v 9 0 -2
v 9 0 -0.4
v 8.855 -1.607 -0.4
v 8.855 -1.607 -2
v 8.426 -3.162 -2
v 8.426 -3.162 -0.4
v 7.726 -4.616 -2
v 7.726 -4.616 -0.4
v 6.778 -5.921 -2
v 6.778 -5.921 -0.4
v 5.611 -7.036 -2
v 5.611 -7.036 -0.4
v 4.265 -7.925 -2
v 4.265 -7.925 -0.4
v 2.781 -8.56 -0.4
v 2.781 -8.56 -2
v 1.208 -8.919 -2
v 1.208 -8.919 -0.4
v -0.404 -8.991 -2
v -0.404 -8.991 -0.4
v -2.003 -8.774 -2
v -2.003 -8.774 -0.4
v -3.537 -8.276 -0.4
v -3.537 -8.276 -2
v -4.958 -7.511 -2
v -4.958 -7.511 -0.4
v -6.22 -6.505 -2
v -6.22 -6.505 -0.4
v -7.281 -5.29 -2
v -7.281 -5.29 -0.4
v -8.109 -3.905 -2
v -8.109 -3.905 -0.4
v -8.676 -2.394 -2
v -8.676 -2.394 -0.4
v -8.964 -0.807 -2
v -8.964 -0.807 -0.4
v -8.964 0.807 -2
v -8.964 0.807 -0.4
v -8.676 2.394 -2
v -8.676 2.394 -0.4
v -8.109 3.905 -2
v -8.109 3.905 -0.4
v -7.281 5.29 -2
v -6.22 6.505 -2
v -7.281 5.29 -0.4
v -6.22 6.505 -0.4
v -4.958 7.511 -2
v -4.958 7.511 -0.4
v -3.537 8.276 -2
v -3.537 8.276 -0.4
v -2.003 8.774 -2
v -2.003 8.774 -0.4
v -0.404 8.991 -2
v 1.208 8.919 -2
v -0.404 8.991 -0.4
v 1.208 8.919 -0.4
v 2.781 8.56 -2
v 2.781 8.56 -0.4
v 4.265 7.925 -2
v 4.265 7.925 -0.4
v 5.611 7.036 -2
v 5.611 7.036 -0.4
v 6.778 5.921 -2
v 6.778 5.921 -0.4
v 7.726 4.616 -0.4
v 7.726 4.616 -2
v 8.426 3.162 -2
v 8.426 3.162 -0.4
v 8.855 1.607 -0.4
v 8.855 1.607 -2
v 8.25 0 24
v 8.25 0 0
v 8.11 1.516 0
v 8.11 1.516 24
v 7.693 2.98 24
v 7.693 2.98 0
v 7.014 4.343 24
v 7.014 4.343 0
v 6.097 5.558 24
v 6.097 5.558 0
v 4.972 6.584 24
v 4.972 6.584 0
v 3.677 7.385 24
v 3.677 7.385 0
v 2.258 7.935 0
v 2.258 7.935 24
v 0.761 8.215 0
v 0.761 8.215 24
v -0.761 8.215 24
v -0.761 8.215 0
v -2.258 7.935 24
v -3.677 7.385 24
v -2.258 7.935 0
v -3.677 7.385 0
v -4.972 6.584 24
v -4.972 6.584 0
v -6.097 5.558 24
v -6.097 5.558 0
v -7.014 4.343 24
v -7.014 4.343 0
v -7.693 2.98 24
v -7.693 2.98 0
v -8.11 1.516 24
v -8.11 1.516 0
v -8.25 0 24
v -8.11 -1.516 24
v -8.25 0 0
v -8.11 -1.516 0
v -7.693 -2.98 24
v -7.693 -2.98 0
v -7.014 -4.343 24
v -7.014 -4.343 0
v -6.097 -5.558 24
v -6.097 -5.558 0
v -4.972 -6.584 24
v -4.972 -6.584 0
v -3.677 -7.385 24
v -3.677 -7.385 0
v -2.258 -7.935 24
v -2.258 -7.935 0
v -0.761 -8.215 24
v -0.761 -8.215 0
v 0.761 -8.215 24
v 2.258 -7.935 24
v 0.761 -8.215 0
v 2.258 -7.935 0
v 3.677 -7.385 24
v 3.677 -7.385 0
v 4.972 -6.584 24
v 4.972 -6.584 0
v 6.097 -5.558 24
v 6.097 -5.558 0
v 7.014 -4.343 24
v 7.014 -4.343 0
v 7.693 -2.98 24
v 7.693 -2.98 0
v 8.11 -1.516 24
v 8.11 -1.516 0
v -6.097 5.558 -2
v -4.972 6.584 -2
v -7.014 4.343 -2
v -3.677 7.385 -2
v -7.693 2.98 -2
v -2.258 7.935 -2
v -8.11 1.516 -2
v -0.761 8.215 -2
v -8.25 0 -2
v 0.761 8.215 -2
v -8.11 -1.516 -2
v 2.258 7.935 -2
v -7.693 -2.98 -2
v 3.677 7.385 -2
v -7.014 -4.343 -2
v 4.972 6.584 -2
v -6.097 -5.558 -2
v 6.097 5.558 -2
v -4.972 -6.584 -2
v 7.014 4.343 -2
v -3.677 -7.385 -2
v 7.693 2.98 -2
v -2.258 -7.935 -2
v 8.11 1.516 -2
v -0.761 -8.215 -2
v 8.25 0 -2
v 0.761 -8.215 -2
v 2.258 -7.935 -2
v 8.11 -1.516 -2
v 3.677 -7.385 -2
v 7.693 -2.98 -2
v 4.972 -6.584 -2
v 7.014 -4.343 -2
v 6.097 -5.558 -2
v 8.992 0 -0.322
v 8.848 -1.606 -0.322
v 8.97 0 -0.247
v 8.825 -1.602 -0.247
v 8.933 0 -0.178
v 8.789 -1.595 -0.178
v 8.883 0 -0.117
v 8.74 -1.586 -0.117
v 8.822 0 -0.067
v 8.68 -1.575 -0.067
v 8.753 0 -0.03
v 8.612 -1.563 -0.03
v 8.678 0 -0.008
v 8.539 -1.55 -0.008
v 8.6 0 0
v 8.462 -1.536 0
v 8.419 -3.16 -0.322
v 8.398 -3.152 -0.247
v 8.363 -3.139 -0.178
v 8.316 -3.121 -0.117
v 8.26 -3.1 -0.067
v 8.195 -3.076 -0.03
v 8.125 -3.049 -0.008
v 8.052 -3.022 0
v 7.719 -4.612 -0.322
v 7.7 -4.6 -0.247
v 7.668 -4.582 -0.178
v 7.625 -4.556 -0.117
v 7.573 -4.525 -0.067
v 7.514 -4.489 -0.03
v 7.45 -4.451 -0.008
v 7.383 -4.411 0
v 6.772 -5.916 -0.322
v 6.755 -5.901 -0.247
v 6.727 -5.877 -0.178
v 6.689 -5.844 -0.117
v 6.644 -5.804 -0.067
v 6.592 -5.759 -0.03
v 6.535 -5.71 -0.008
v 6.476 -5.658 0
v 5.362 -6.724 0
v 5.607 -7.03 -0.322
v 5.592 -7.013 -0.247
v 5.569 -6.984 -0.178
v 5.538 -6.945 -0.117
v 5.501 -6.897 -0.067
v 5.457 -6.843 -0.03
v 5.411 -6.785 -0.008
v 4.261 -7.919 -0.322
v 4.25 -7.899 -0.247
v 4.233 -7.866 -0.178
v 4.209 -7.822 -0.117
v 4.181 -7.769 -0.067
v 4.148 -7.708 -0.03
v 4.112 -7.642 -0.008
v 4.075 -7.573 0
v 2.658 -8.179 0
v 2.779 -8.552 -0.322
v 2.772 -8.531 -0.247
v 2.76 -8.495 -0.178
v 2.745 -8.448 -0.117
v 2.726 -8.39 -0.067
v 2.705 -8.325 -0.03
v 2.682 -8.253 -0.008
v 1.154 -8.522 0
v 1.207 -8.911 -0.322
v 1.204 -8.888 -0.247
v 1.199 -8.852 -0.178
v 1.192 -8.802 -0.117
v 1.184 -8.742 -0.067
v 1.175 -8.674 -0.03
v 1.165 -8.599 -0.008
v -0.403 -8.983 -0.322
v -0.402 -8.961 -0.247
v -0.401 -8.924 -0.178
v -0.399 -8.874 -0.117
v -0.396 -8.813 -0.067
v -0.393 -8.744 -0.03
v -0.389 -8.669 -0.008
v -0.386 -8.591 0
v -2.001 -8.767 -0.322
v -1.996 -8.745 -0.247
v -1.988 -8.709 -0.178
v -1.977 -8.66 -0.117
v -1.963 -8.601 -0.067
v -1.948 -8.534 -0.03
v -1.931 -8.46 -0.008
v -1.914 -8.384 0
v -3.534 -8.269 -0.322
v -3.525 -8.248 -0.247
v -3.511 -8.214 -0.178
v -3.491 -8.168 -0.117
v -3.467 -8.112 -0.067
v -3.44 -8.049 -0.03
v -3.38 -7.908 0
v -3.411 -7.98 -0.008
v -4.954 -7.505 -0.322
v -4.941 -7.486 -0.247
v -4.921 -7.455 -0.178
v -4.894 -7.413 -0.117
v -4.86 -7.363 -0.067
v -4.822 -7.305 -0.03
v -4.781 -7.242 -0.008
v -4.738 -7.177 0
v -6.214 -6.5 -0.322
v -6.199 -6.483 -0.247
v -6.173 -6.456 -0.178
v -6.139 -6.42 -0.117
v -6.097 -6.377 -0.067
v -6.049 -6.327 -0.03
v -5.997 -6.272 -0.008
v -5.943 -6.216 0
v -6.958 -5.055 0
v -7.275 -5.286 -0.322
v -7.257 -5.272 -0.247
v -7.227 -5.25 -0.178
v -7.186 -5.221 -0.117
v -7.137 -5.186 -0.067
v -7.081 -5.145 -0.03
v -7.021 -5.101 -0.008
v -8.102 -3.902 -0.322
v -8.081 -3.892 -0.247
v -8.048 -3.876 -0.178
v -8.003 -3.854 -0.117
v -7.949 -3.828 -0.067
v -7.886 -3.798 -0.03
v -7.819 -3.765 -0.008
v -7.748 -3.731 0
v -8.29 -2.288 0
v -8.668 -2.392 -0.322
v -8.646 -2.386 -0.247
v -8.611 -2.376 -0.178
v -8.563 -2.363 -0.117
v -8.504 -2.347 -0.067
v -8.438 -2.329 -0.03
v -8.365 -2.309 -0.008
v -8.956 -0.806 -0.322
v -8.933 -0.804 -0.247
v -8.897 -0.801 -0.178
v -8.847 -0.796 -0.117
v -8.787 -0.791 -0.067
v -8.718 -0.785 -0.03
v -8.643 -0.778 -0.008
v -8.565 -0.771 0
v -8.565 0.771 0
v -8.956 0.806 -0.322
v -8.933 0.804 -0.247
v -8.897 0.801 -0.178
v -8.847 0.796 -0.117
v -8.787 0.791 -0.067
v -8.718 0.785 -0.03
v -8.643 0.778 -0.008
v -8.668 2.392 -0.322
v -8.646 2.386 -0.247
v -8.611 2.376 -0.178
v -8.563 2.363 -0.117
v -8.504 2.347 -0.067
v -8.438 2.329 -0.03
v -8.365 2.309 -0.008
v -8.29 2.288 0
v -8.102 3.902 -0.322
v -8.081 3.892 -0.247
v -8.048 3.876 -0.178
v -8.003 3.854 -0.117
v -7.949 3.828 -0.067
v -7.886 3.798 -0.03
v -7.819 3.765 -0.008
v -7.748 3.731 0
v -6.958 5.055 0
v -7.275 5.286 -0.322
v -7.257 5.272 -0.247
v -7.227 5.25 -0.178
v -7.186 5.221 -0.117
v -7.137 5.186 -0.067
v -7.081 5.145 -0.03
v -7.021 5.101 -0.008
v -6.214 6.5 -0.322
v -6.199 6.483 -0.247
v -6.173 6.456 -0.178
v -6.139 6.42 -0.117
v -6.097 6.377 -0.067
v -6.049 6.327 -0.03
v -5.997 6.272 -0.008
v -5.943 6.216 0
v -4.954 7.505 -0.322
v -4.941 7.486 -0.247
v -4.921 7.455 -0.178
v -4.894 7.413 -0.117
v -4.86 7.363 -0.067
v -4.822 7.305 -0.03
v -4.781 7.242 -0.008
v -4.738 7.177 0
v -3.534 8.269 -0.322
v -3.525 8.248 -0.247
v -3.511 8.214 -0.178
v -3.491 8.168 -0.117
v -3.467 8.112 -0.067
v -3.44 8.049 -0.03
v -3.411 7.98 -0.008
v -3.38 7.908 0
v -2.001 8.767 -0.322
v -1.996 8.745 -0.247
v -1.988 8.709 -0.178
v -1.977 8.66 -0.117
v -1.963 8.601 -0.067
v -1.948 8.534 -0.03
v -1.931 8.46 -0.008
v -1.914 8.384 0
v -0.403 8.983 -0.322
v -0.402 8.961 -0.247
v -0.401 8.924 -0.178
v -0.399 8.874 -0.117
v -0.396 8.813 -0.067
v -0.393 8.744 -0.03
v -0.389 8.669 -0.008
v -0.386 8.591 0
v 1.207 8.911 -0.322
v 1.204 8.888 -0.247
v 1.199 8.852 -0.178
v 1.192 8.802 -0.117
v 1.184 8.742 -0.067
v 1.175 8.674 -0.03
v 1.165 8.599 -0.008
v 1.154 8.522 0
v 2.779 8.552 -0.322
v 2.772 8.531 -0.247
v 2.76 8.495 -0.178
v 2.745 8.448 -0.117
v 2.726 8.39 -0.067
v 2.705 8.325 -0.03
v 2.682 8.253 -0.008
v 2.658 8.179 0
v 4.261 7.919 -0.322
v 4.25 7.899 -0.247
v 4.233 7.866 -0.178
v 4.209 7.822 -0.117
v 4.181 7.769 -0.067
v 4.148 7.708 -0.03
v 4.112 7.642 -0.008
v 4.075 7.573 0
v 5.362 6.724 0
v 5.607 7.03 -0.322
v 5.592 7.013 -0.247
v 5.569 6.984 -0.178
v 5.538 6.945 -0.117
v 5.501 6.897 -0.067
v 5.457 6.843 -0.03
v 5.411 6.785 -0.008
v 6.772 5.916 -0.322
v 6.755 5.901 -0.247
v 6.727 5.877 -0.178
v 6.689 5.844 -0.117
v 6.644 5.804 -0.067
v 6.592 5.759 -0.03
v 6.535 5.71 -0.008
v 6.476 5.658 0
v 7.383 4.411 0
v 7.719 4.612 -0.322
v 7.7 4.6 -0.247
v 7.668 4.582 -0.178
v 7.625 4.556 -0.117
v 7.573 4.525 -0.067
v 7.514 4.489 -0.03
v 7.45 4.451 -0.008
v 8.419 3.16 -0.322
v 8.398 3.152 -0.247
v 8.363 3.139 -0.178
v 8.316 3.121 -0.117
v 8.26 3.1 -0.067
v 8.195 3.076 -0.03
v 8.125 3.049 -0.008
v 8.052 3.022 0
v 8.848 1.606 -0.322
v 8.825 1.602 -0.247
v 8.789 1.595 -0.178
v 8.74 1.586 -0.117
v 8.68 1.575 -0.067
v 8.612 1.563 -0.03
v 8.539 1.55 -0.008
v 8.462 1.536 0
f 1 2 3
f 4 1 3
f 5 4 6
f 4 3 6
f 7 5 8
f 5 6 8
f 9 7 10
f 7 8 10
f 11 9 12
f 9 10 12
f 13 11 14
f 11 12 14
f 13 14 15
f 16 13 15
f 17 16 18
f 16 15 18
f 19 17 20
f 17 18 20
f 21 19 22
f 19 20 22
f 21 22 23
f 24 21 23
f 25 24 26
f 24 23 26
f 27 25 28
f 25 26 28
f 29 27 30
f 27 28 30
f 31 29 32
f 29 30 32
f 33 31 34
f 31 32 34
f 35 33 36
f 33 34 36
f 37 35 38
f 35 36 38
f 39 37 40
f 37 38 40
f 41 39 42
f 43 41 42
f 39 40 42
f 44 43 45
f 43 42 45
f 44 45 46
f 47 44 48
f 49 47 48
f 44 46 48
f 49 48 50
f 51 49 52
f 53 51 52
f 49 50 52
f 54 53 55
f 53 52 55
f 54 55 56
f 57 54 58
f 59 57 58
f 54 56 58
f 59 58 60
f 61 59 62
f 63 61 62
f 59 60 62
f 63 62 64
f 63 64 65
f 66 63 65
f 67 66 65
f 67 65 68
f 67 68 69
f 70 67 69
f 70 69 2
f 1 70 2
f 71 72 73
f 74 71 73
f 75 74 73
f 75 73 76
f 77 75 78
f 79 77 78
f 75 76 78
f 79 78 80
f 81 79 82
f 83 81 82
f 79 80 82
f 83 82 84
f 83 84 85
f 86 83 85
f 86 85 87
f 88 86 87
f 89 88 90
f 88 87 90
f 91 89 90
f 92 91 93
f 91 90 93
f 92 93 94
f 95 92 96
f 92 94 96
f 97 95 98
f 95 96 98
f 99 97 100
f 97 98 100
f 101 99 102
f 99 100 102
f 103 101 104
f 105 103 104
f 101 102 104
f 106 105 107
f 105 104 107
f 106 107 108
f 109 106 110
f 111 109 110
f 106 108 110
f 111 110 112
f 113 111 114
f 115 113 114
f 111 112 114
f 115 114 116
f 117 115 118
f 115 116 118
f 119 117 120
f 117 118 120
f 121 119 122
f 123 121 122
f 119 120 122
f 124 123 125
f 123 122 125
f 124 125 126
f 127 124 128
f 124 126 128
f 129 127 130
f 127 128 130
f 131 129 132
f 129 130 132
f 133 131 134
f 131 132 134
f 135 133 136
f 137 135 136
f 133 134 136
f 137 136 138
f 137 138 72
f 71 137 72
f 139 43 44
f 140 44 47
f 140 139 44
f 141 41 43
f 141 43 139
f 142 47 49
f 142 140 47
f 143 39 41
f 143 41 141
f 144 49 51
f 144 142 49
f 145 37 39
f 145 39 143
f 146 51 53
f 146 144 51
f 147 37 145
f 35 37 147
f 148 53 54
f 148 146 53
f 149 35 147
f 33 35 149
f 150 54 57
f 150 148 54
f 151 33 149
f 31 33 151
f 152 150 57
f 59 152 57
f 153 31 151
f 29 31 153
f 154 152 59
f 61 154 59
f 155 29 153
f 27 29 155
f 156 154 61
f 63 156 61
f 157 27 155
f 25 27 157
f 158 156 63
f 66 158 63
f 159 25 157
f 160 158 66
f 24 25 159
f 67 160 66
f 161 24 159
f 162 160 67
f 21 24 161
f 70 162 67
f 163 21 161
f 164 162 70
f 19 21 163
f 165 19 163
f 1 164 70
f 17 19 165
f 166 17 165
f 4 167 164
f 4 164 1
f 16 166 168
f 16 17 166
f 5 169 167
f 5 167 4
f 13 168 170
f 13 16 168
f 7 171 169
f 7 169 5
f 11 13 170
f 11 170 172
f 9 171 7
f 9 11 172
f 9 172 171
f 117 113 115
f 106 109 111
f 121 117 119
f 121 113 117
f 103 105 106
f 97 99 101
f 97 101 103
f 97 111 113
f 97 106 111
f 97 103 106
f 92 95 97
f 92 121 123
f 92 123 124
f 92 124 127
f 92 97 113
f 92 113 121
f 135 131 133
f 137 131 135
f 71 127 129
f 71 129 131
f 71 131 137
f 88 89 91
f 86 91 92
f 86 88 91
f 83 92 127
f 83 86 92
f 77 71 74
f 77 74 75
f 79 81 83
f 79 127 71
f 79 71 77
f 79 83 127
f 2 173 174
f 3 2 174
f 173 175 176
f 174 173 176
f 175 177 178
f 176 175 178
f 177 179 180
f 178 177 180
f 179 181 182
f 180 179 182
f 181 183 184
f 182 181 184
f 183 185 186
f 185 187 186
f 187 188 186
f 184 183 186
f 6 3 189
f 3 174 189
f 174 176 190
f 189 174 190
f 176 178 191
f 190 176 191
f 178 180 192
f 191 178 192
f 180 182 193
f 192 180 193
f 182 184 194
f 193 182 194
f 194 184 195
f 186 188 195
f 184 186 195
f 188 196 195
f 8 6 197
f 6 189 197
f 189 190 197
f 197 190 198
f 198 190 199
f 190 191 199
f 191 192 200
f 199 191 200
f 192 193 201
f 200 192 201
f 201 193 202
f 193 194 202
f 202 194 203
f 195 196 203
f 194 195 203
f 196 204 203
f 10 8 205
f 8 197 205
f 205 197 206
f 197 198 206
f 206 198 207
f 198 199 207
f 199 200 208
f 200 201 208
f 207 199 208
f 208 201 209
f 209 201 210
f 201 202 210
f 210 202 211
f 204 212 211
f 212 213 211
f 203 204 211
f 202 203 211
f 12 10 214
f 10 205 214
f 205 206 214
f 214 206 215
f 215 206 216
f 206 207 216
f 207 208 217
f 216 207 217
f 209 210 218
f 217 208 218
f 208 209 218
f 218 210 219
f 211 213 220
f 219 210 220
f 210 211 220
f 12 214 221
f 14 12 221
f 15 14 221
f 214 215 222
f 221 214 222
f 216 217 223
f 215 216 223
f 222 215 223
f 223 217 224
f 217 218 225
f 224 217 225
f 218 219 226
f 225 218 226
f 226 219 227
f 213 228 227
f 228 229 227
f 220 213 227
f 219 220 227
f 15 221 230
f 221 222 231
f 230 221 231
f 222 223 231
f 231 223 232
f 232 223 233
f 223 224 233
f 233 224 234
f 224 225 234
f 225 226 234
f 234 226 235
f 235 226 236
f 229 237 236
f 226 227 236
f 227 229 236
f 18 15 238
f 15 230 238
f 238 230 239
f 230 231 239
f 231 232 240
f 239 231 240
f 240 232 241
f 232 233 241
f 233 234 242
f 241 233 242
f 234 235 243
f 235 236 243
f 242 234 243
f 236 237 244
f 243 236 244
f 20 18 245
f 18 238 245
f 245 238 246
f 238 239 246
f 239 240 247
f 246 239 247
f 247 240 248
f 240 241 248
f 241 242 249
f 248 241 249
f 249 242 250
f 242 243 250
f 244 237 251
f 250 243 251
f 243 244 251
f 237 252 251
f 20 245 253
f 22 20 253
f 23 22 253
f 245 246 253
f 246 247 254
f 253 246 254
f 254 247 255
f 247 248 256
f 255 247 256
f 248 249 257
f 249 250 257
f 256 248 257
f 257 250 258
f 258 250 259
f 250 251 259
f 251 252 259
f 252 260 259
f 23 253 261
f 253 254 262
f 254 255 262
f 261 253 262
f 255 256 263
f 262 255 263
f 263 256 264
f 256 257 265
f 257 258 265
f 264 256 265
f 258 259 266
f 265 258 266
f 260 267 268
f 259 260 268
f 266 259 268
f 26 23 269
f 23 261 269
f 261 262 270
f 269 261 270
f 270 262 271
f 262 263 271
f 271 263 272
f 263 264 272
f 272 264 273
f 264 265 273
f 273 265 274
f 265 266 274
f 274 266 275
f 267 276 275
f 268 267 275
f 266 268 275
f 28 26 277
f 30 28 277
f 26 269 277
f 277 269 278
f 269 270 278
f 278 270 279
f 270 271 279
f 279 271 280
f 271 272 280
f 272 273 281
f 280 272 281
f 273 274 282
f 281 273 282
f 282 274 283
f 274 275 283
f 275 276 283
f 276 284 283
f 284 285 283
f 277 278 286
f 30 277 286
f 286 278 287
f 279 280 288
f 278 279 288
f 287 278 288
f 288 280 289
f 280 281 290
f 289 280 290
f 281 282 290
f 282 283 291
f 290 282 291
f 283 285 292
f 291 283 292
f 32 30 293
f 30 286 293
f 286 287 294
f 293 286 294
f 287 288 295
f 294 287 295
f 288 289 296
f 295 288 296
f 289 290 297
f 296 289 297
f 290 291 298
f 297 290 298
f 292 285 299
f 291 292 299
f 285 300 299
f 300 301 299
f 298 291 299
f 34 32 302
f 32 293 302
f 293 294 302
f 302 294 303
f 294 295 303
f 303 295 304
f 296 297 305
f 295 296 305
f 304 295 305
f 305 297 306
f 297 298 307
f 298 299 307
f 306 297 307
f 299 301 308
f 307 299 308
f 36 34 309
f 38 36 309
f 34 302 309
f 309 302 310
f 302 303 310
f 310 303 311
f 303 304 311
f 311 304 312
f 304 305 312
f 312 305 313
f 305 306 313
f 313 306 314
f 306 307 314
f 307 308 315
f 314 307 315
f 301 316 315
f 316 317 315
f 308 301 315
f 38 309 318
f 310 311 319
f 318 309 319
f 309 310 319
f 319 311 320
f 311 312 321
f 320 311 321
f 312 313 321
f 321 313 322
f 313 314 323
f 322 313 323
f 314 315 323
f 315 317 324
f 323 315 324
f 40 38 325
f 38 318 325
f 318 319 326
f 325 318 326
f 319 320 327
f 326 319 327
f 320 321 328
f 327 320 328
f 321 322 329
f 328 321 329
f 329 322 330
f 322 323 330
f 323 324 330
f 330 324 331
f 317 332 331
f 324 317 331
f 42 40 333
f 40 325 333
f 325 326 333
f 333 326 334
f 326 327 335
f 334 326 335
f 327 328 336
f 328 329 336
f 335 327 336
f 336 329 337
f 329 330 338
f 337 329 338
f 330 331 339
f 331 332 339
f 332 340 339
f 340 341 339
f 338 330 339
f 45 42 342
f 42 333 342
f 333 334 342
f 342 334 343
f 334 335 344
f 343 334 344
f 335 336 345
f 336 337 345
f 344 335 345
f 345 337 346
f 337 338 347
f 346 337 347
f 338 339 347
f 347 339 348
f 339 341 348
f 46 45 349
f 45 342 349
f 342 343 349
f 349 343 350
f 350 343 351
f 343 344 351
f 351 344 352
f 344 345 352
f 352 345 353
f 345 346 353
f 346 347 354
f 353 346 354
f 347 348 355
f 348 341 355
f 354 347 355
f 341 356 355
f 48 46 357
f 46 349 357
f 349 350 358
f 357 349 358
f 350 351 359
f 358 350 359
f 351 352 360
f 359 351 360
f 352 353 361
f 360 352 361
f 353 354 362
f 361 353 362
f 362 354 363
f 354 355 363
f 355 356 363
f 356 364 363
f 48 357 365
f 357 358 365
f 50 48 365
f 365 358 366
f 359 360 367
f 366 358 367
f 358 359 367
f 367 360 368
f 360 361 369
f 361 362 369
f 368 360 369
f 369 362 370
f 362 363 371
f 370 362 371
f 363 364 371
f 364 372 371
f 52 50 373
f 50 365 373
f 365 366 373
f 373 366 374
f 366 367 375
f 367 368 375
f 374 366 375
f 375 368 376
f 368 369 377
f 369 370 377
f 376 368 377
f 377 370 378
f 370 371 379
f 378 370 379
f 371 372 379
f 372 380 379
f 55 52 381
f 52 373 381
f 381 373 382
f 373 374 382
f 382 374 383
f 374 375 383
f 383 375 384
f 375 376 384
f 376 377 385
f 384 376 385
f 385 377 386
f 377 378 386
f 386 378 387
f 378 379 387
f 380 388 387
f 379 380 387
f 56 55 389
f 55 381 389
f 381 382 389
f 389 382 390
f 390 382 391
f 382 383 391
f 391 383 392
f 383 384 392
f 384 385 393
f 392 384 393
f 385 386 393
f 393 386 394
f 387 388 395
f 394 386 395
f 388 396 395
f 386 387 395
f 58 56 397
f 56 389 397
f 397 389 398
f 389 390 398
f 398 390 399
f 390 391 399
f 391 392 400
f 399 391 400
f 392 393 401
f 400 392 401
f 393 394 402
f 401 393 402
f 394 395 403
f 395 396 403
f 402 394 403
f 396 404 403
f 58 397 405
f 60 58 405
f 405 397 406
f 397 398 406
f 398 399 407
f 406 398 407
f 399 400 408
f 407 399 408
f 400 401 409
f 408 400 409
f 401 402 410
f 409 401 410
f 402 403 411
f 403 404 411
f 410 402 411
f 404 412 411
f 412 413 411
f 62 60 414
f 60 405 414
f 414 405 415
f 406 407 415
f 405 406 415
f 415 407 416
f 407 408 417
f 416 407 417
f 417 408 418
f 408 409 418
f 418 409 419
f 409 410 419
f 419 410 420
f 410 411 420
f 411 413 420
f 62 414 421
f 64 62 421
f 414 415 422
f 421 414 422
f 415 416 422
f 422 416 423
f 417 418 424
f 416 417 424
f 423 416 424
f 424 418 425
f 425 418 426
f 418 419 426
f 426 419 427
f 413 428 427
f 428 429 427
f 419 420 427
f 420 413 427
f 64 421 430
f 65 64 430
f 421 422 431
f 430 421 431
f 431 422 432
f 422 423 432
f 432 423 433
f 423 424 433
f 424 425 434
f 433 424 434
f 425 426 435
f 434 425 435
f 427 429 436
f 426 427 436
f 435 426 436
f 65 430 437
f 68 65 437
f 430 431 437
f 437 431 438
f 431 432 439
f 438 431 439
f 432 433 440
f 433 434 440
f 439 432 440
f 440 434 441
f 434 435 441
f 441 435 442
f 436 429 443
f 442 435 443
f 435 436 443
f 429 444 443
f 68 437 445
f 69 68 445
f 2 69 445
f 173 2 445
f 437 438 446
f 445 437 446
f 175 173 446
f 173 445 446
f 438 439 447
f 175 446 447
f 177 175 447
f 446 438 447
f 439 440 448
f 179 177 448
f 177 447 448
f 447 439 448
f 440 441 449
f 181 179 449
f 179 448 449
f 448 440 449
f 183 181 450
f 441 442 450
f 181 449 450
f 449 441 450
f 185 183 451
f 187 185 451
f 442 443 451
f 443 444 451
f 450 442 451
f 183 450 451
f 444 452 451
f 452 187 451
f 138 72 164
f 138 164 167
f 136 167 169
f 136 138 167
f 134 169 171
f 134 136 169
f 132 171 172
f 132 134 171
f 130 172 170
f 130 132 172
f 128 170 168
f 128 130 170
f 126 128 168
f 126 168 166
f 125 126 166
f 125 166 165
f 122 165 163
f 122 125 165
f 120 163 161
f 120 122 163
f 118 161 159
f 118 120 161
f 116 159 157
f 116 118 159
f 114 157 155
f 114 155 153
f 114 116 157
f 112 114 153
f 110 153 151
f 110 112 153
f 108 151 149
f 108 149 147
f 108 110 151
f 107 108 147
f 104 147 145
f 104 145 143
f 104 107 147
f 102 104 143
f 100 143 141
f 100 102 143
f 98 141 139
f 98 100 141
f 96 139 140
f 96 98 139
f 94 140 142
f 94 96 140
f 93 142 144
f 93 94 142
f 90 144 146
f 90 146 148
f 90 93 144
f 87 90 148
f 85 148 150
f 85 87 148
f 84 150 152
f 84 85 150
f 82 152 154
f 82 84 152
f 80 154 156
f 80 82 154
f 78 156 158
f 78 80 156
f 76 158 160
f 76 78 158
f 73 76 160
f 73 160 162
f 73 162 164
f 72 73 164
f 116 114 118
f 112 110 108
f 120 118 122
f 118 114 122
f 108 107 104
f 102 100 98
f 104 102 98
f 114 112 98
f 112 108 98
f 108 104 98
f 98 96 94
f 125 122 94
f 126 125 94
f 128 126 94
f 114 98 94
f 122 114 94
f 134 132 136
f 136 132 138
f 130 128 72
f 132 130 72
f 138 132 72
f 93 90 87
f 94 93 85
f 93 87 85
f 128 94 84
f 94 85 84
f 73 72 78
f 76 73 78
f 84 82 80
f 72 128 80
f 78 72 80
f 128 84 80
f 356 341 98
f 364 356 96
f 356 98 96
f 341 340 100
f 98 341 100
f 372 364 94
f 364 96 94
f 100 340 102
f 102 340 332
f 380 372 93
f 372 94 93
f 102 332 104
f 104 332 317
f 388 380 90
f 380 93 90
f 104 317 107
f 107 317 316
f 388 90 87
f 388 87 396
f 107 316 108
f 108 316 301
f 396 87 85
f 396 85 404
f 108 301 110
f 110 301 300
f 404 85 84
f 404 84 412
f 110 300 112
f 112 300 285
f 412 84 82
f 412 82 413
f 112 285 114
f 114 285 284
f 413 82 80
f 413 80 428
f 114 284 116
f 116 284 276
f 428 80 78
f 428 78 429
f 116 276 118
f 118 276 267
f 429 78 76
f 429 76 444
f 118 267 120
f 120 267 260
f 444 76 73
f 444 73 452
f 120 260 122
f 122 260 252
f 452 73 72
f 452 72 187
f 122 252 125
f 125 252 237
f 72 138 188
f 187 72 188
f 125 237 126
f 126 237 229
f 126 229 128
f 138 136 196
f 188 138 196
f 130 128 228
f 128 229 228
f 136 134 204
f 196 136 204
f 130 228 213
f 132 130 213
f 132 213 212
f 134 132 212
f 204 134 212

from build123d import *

# Parameters (mm, degrees)
F0_R     = 8.25
F1_DEPTH = 24
F2_R     = 9
F2_R_2   = 8.25
F3_DEPTH = 2
F4_R     = 0.4


with BuildPart() as f1:
    # F0 (on Top) → F1 (new body)
    with BuildSketch(Plane.XY):
        Circle(F0_R)
    extrude(amount=F1_DEPTH)


with BuildPart() as f3:
    # F2 (on face) → F3 (new body)
    with BuildSketch(Plane(origin=(0, 0, 0), x_dir=(1, 0, 0), z_dir=(0, 0, -1))):
        Circle(F2_R)
        Circle(F2_R_2, mode=Mode.SUBTRACT)
    extrude(amount=F3_DEPTH)

    # F4
    f4_edges = [f3.edges().sort_by_distance(p)[0] for p in [
        (-9, 0, 0),
    ]]
    fillet(f4_edges, radius=F4_R)


solid = Compound([f1.part, f3.part])
